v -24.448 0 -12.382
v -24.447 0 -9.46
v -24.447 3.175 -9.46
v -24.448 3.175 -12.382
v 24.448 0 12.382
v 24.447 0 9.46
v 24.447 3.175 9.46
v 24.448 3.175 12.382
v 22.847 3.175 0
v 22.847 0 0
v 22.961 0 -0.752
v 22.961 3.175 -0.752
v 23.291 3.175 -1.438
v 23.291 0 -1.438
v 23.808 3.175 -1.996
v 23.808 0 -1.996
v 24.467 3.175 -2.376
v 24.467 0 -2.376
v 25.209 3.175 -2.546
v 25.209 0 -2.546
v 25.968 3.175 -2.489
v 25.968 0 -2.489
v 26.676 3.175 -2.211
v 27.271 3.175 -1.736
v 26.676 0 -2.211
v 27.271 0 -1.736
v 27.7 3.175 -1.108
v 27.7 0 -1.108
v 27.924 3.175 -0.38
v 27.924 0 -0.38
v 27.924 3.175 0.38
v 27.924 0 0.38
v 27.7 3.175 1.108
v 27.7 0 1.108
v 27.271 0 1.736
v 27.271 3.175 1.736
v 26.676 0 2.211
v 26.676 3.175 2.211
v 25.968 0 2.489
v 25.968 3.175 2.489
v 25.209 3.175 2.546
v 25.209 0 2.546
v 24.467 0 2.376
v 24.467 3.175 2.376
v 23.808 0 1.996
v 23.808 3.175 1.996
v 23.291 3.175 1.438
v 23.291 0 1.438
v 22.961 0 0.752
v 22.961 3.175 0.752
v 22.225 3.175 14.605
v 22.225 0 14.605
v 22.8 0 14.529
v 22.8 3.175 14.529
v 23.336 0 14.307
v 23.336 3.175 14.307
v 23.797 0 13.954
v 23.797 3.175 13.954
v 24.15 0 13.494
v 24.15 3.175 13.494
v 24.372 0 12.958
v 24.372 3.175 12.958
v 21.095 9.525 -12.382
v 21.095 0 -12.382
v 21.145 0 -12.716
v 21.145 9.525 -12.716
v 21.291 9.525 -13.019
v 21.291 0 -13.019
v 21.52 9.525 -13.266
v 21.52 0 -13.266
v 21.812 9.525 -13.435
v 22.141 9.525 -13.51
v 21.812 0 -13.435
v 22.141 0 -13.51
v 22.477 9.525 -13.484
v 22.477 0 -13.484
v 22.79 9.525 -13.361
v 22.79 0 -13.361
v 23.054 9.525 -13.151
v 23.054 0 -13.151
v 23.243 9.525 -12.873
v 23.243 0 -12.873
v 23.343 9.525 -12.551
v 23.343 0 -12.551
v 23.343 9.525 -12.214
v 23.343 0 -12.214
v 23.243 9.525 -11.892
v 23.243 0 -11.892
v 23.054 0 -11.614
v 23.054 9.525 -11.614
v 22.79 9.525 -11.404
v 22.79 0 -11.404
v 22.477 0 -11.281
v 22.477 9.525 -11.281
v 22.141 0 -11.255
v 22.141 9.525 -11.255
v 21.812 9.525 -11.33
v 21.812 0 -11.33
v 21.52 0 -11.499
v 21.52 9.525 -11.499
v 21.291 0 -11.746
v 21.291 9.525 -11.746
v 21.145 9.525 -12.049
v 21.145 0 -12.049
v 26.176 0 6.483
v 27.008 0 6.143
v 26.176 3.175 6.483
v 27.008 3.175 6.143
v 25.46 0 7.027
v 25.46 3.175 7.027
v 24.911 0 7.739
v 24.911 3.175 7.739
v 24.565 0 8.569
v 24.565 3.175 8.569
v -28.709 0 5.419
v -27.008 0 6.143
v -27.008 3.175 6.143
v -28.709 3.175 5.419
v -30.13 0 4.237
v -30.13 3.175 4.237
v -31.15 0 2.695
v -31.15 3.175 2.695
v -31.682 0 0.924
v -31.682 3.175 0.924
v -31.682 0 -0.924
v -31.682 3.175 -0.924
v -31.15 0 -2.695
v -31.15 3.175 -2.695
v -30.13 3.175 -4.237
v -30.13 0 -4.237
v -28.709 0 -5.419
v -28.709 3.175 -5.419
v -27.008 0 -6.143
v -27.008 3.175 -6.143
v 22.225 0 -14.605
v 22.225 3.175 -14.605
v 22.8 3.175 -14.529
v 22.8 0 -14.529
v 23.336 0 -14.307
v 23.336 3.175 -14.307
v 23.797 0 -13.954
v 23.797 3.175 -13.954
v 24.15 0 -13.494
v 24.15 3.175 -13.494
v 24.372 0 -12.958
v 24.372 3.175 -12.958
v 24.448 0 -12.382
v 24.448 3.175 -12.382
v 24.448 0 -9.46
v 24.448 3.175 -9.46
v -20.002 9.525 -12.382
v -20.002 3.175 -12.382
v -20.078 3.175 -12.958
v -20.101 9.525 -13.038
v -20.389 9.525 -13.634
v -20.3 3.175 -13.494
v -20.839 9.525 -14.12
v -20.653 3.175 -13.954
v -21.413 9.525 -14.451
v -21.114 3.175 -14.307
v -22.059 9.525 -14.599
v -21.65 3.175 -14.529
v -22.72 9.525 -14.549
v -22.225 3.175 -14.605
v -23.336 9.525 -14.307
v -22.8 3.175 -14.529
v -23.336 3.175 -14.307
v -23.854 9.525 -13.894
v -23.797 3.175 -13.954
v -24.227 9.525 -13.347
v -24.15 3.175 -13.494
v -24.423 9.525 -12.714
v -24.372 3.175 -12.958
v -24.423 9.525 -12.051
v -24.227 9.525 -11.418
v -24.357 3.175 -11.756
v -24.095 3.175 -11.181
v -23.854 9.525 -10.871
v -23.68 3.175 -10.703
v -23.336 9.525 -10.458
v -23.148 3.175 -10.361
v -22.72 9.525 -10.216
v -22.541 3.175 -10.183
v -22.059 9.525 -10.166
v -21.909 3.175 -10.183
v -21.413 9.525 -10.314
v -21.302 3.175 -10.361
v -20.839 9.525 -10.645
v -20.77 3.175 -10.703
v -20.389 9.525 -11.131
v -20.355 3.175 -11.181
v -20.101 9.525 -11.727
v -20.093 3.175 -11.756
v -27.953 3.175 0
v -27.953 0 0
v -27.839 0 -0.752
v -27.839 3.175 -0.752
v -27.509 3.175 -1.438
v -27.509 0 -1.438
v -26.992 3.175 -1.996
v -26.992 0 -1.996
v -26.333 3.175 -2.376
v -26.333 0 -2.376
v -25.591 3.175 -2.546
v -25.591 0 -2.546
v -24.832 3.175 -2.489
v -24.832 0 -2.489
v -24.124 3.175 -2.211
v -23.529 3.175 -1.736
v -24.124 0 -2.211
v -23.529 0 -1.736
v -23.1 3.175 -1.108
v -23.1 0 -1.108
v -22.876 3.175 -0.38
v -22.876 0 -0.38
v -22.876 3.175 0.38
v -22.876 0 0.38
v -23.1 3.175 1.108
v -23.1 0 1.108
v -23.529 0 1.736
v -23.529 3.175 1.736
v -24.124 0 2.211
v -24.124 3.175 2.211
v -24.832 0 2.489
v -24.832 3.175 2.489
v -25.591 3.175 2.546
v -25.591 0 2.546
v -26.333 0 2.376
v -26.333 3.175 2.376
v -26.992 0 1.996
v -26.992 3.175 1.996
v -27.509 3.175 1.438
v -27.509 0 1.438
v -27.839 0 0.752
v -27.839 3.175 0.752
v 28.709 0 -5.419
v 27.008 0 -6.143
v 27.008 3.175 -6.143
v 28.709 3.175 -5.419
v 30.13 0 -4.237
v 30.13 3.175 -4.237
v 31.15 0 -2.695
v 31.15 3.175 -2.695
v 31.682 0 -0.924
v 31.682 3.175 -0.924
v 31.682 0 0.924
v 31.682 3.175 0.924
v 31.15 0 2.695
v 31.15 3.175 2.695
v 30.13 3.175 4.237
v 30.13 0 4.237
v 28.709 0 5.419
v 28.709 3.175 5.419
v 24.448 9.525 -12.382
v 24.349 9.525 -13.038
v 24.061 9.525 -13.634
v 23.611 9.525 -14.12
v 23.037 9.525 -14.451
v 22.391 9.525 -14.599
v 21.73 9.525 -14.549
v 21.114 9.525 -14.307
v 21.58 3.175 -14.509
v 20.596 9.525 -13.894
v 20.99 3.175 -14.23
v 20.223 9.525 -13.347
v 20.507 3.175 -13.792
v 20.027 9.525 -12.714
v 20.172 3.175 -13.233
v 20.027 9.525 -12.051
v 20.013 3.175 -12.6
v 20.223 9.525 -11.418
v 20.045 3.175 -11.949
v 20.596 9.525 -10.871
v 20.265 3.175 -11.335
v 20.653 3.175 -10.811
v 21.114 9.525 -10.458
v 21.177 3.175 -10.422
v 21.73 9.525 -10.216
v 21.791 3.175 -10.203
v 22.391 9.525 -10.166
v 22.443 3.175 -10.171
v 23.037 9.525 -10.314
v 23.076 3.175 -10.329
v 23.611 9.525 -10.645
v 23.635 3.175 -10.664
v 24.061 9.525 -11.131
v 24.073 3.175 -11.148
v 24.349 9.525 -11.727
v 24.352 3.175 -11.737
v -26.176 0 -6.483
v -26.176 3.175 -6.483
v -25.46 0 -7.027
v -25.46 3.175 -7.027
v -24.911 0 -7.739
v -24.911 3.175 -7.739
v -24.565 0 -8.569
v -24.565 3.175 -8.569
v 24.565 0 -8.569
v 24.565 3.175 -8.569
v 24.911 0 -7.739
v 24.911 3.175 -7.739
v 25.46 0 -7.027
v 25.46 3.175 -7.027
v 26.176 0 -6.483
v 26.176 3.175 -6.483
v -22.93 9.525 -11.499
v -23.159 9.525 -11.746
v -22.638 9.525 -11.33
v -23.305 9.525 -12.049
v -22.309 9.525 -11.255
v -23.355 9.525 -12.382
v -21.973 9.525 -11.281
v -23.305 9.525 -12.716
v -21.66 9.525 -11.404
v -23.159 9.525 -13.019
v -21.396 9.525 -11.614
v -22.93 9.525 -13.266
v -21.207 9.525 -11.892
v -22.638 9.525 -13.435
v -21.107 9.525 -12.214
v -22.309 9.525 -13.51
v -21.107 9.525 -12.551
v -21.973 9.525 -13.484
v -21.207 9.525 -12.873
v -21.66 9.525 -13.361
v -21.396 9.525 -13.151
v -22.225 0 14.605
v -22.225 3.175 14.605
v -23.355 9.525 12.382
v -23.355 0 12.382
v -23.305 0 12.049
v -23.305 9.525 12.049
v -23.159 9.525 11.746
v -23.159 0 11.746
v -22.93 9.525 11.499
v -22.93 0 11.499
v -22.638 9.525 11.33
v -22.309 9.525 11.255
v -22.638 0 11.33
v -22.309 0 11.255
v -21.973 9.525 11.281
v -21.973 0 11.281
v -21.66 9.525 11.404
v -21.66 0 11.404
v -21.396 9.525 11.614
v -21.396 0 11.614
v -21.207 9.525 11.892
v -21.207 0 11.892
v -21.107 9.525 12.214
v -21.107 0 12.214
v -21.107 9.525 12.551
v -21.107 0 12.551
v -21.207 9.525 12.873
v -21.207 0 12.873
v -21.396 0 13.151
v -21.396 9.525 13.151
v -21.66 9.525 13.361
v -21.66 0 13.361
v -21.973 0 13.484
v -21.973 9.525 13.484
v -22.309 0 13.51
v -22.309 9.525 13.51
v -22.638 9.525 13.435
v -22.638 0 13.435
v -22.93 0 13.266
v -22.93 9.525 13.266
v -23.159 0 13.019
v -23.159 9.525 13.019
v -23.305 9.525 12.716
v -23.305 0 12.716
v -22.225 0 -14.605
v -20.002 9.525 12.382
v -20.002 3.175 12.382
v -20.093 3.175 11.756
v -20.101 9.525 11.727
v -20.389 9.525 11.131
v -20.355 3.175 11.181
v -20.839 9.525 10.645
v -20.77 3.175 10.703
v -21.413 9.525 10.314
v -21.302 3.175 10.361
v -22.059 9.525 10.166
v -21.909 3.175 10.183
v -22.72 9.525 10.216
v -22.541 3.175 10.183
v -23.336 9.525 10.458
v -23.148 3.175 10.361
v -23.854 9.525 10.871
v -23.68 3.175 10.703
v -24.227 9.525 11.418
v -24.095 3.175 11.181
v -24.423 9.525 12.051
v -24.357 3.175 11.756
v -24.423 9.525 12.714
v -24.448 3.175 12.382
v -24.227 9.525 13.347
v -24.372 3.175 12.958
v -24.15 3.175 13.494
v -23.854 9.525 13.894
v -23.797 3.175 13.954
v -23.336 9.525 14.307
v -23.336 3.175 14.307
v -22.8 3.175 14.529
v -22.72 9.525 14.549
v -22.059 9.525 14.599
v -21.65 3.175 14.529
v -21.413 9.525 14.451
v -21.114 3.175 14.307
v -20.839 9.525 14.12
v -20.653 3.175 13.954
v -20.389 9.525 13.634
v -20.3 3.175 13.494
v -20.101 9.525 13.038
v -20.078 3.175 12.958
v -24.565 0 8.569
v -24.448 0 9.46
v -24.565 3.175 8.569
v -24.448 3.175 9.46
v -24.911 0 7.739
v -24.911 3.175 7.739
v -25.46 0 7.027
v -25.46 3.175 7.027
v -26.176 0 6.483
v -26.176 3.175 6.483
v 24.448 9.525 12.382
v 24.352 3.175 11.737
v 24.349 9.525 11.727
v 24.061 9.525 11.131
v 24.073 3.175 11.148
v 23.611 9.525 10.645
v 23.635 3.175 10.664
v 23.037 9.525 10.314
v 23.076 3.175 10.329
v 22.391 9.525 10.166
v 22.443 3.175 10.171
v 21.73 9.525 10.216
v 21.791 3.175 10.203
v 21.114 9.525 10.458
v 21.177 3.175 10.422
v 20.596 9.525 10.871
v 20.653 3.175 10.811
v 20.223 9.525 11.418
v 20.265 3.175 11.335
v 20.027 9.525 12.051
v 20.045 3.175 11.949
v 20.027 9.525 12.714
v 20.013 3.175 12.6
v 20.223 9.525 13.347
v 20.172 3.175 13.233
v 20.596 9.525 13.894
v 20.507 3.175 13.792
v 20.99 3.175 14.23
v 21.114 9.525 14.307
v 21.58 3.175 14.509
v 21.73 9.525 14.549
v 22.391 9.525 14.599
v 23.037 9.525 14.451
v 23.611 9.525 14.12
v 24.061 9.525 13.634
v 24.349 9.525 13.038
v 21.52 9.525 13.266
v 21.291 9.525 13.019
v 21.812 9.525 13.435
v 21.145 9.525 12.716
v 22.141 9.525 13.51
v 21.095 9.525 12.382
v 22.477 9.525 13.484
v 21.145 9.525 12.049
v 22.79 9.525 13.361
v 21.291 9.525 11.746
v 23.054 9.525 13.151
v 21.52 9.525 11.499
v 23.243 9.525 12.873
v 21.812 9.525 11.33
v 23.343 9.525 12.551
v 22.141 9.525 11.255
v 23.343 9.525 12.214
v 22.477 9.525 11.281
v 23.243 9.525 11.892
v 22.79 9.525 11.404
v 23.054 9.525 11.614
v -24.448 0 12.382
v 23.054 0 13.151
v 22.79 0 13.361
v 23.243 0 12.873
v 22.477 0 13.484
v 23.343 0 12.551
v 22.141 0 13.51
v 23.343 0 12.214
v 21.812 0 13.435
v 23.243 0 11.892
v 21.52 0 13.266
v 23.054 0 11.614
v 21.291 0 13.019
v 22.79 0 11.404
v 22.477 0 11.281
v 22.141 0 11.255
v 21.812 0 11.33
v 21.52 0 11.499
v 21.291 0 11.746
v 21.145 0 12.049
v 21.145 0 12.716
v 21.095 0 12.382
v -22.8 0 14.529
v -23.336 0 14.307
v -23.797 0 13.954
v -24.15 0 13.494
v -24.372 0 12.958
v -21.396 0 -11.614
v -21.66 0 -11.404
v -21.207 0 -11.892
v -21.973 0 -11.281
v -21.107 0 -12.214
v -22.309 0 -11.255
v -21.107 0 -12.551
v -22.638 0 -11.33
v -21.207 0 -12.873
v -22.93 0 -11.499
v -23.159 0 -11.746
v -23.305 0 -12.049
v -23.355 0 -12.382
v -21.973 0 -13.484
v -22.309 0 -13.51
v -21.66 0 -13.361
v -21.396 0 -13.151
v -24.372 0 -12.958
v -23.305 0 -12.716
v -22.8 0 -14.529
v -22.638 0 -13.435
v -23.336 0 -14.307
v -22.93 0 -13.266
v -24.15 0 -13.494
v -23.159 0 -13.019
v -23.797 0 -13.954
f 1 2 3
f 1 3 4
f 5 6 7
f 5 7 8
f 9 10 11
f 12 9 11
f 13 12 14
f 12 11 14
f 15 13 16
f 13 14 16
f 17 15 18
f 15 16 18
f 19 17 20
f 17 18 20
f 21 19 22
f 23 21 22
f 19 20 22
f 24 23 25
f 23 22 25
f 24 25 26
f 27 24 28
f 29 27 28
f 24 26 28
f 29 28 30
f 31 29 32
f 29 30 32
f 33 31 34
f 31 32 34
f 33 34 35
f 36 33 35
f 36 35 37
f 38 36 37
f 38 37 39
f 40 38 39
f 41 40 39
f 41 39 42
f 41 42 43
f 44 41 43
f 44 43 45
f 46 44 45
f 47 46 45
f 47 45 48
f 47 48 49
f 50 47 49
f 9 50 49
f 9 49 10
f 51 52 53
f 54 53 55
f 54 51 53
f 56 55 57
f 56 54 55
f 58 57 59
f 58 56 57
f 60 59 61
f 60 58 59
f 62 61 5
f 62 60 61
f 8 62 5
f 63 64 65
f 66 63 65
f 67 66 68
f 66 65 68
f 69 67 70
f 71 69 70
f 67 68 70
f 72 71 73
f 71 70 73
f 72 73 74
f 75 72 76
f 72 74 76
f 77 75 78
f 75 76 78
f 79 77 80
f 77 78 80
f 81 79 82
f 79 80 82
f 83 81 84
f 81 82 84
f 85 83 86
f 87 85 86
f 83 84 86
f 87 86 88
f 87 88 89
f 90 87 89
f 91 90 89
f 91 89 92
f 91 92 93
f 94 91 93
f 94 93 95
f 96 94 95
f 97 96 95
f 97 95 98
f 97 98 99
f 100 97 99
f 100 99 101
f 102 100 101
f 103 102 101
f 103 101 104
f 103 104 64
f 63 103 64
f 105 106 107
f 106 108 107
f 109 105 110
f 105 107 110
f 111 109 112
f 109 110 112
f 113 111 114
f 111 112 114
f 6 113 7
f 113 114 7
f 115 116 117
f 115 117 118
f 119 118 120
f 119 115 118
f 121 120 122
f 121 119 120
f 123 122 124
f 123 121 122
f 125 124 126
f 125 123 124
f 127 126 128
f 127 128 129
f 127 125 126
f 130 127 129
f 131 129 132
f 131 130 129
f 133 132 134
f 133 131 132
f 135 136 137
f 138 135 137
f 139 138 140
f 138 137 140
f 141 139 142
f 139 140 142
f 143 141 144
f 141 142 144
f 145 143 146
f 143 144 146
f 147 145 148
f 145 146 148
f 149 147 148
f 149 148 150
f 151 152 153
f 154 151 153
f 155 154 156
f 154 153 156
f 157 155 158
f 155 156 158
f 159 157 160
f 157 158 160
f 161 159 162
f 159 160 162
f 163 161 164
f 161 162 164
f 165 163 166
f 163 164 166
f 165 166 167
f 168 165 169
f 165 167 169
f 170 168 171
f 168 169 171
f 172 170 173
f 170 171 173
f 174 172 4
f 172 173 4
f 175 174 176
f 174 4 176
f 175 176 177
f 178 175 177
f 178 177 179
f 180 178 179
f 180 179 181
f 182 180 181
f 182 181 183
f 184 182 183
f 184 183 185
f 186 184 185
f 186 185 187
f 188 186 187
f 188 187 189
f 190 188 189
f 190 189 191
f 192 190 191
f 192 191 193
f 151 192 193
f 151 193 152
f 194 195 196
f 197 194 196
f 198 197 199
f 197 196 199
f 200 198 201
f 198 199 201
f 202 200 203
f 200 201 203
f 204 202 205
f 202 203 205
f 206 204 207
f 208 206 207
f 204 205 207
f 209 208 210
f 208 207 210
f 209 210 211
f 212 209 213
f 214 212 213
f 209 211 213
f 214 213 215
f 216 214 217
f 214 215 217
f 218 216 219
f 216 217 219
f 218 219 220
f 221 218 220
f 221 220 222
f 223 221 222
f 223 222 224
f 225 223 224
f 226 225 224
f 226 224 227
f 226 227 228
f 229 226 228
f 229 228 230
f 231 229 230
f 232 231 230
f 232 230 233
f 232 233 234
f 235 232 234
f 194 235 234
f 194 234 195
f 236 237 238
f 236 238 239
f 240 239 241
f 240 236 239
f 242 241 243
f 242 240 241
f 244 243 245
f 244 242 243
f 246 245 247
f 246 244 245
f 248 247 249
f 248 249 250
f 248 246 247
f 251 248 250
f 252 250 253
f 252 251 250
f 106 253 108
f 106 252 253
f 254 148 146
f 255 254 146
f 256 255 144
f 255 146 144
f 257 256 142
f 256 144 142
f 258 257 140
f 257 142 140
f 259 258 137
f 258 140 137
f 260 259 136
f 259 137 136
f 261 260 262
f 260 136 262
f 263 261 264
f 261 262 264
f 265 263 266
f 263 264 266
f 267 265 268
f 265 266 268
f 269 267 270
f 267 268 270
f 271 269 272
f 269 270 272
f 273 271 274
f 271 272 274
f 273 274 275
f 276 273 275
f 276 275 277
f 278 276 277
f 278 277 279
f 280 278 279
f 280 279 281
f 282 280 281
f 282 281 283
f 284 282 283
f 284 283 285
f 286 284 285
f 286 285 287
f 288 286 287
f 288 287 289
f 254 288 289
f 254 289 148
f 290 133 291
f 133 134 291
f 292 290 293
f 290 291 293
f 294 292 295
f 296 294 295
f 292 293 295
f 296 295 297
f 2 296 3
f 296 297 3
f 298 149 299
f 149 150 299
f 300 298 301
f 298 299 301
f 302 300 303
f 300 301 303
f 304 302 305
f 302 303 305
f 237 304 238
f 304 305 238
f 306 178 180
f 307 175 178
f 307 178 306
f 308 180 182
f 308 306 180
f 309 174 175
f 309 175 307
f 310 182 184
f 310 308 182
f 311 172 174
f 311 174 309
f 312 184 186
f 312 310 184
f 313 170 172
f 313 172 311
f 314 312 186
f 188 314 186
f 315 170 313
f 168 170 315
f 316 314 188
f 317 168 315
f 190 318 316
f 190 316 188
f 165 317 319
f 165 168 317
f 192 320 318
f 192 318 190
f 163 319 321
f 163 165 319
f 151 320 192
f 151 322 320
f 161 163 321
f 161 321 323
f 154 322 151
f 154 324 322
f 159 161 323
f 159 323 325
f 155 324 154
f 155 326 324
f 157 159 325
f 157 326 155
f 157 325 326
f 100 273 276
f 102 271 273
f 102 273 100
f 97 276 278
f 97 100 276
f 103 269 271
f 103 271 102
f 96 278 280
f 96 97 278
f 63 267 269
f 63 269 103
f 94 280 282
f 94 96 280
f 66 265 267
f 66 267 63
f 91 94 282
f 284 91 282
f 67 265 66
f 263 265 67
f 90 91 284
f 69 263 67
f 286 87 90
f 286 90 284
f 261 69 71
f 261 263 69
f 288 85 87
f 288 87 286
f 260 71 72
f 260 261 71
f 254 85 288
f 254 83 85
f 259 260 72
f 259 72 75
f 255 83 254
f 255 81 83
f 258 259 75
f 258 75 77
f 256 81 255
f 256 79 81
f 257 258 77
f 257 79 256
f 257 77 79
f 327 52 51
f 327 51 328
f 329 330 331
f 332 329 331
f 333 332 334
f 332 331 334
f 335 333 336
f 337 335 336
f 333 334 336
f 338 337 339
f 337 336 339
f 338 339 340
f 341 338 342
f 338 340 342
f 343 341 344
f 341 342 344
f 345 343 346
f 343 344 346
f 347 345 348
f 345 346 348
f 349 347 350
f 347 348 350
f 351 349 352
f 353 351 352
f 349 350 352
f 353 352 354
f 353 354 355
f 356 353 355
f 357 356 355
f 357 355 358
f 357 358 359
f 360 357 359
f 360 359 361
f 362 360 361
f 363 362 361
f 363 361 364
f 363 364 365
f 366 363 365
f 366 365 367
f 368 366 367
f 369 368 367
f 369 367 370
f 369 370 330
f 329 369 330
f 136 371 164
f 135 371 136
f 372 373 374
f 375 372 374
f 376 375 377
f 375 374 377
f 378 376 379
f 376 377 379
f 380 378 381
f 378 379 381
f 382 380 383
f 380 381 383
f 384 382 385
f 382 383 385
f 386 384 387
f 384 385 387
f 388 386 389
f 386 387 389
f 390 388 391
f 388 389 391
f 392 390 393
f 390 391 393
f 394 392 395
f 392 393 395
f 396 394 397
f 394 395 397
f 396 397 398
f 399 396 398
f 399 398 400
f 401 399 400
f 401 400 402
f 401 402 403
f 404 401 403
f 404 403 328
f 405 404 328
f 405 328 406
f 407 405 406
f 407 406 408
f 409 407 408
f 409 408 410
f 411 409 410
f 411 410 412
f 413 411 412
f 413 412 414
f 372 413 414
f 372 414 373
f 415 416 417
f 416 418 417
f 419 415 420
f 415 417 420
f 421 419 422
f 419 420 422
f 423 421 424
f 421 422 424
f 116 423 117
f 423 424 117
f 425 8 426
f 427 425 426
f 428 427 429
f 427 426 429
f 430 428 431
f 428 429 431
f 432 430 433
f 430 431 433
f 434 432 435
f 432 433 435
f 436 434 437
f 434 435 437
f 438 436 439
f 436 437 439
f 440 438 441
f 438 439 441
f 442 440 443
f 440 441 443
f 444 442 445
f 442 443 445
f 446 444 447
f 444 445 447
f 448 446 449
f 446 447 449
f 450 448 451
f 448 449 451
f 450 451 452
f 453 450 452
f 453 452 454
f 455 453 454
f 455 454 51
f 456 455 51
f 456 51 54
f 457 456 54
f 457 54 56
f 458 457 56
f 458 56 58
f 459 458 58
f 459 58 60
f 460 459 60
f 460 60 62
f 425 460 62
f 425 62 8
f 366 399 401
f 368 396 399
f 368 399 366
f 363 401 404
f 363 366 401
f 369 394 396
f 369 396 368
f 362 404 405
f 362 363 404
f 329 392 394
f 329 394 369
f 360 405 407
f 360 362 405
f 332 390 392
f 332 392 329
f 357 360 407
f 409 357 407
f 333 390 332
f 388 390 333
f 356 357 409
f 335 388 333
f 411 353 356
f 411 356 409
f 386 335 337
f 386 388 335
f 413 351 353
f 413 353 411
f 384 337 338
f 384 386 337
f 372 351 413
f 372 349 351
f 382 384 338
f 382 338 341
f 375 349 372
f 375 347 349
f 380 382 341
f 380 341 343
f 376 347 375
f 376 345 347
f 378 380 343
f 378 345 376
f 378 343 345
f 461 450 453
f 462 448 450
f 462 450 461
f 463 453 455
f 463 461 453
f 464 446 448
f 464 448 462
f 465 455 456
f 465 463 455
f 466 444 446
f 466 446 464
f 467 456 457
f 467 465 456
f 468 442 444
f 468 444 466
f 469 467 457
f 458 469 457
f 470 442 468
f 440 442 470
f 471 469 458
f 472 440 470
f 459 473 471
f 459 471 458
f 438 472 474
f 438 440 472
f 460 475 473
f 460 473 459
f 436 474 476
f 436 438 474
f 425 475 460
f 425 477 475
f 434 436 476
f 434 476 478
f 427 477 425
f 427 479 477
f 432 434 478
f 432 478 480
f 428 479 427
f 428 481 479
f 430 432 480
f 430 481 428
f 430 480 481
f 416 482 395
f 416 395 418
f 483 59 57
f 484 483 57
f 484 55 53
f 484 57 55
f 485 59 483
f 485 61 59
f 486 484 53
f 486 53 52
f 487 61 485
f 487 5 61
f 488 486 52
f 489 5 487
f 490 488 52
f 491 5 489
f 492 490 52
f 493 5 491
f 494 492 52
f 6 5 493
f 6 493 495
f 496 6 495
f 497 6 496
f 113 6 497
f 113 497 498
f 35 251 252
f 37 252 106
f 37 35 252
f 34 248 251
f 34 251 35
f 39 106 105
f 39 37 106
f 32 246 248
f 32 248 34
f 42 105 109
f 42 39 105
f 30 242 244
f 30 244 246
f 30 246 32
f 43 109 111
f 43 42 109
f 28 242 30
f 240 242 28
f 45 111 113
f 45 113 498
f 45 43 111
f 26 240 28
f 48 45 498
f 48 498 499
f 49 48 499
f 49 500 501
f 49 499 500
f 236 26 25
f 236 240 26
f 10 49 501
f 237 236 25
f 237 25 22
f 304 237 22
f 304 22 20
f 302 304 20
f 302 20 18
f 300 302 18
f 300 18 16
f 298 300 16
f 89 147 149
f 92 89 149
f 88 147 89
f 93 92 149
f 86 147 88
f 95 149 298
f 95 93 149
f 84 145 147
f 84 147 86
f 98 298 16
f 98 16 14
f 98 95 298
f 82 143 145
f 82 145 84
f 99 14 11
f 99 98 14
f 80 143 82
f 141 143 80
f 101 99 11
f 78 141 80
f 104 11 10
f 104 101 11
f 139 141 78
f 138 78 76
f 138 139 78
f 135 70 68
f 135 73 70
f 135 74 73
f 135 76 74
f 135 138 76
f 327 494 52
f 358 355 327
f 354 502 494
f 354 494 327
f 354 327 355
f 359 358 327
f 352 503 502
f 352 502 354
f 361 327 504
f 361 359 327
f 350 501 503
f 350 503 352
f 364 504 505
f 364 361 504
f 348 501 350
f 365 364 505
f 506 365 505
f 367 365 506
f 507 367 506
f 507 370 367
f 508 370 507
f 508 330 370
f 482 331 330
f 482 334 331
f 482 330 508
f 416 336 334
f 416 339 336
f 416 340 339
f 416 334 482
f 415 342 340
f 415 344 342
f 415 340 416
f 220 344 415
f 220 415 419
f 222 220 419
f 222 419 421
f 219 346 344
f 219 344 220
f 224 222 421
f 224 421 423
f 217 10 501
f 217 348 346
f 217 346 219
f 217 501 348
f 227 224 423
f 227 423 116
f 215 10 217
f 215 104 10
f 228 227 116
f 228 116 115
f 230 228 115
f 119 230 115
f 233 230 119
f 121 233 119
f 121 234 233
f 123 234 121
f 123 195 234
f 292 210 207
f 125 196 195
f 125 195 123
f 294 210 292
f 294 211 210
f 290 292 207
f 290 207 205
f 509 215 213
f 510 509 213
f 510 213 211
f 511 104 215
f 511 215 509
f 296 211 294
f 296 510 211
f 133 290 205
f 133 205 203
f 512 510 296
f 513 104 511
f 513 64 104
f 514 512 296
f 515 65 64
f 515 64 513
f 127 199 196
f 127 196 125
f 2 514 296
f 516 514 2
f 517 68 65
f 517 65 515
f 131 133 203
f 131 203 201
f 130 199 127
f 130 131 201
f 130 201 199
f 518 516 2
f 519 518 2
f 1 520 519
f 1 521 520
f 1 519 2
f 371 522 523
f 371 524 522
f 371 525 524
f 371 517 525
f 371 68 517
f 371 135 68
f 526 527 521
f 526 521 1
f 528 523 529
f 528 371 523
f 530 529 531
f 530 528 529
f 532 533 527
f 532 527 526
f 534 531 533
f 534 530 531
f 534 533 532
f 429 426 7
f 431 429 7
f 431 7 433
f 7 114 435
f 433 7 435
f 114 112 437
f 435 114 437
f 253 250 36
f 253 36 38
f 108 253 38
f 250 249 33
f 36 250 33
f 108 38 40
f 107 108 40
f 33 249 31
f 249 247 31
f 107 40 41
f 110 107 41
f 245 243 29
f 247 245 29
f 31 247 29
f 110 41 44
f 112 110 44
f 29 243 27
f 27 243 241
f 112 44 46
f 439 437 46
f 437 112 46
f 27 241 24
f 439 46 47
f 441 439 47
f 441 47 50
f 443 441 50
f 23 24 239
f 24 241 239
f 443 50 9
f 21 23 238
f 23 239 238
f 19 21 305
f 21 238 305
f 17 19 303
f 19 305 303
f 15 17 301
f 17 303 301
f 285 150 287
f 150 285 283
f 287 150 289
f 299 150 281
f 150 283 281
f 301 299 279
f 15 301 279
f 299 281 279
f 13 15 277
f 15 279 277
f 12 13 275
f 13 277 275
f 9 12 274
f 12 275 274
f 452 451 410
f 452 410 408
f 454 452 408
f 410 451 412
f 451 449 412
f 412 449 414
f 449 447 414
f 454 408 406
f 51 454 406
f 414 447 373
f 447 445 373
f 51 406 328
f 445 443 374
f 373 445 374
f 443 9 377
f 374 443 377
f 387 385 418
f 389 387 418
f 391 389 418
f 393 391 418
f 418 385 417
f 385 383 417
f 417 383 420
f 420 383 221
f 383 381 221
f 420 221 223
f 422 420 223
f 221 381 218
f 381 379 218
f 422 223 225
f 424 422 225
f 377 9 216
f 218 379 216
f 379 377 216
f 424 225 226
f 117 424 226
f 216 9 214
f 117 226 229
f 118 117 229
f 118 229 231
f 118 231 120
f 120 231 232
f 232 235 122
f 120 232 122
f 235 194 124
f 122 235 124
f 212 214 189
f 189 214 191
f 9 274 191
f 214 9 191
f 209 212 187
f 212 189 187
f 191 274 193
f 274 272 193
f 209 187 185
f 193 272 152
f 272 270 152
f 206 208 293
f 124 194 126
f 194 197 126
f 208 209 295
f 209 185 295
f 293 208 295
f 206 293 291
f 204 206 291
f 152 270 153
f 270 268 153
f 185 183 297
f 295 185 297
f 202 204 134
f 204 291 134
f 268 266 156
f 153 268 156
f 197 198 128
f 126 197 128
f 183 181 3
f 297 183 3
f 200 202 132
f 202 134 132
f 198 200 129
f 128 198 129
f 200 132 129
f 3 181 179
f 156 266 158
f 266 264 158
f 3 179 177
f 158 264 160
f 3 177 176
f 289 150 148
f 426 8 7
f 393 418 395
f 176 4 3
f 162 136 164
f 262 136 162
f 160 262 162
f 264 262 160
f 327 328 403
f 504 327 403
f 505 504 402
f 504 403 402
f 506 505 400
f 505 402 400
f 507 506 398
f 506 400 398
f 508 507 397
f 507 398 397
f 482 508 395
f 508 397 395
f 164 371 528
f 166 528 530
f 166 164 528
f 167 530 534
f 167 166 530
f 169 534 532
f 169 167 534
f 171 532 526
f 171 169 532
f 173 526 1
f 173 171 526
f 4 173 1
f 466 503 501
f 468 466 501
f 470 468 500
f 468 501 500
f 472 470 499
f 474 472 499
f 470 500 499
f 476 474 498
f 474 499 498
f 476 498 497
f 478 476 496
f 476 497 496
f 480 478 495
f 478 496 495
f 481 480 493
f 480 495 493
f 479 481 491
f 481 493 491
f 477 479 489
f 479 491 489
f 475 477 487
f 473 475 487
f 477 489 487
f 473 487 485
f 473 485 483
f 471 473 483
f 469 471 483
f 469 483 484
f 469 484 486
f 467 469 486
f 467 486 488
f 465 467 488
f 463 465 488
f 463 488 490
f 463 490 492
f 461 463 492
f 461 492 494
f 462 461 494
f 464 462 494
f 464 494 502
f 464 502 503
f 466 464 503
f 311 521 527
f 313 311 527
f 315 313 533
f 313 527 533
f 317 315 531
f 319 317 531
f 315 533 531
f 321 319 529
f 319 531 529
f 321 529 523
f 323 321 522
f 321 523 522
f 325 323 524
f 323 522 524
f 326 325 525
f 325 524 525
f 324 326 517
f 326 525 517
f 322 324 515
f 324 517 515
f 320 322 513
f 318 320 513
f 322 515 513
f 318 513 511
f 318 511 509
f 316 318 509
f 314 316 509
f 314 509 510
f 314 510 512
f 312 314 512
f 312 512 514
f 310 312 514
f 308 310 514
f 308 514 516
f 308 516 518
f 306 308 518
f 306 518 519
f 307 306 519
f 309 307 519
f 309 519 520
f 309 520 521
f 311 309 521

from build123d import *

# Parameters (mm, degrees)
BOSS_EXTRUDE1_DEPTH    = 3.175
FILLET1_R              = 3.429
F_10_CLEARANCE_HOLE1_D = 5.1054
SKETCH4_R              = 2.2225
BOSS_EXTRUDE2_DEPTH    = 6.35
F_4_40_TAPPED_HOLE1_D  = 2.2606
CUT_EXTRUDE1_DEPTH     = 4.175
MIRROR2_COPY_1_DEPTH   = 4.175


with BuildPart() as part:
    # Sketch1 → Boss-Extrude1 (new body)
    with BuildSketch(Plane(origin=(0, 0, 0), x_dir=(1, 0, 0), z_dir=(0, 1, 0))):
        with BuildLine():
            Line((-24.4475, 14.605), (24.4475, 14.605))
            Line((24.4475, 14.605), (24.4475, 6.278156079))
            ThreePointArc((24.4475, 6.278156079), (31.75, 0), (24.4475, -6.278156079))
            Line((24.4475, -6.278156079), (24.4475, -14.605))
            Line((24.4475, -14.605), (-24.4475, -14.605))
            Line((-24.4475, -14.605), (-24.4475, -6.278156079))
            ThreePointArc((-24.4475, -6.278156079), (-31.75, 0), (-24.4475, 6.278156079))
            Line((-24.4475, 6.278156079), (-24.4475, 14.605))
        make_face()
    extrude(amount=BOSS_EXTRUDE1_DEPTH)

    # Fillet1
    fillet1_edges = [part.edges().sort_by_distance(p)[0] for p in [
        (-24.4475, 1.5875, 6.278156079),
        (-24.4475, 1.5875, -6.278156079),
        (24.4475, 1.5875, -6.278156079),
        (24.4475, 1.5875, 6.278156079),
    ]]
    fillet(fillet1_edges, radius=FILLET1_R)

    # #10 Clearance Hole1 (through all)
    with Locations(Plane(origin=(0, 3.175, 0), x_dir=(1, 0, 0), z_dir=(0, 1, 0))):
        with Locations((25.4, 0), (-25.4, 0)):
            Hole(F_10_CLEARANCE_HOLE1_D / 2)

    # Sketch4 → Boss-Extrude2 (add)
    with BuildSketch(Plane(origin=(0, 3.175, 0), x_dir=(1, 0, 0), z_dir=(0, 1, 0))):
        with Locations((-22.225, 12.3825)):
            Circle(SKETCH4_R)
        with Locations((22.225, 12.3825)):
            Circle(SKETCH4_R)
        with Locations((22.225, -12.3825)):
            Circle(SKETCH4_R)
        with Locations((-22.225, -12.3825)):
            Circle(SKETCH4_R)
    extrude(amount=BOSS_EXTRUDE2_DEPTH)

    # #4-40 Tapped Hole1 (through all)
    with Locations(Plane(origin=(0, 9.525, 0), x_dir=(1, 0, 0), z_dir=(0, 1, 0))):
        with Locations((22.225, 12.3825), (-22.225, 12.3825), (-22.225, -12.3825), (22.225, -12.3825)):
            Hole(F_4_40_TAPPED_HOLE1_D / 2)

    # Sketch7 → Cut-Extrude1 (cut, through all)
    with BuildSketch(Plane(origin=(0, 3.175, 0), x_dir=(1, 0, 0), z_dir=(0, 1, 0))):
        with BuildLine():
            Line((-24.4475, -14.605), (-22.225, -14.605))
            ThreePointArc((-22.225, -14.605), (-23.796544821, -13.954044821), (-24.4475, -12.3825))
            Line((-24.4475, -12.3825), (-24.4475, -14.605))
        make_face()
    cut_extrude1 = extrude(amount=-CUT_EXTRUDE1_DEPTH, mode=Mode.SUBTRACT)

    # Mirror1: Cut-Extrude1 across plane
    add(cut_extrude1.mirror(Plane.XY), mode=Mode.SUBTRACT)

    # Mirror2: Cut-Extrude1 across plane
    add(cut_extrude1.mirror(Plane(origin=(0, 0, 0), x_dir=(0, 0, 1), z_dir=(1, 0, 0))), mode=Mode.SUBTRACT)

    # Mirror2 copy 1 sketch → Mirror2 copy 1 (cut, through all)
    with BuildSketch(Plane(origin=(0, 3.175, 0), x_dir=(-1, 0, 0), z_dir=(0, 1, 0))):
        with BuildLine():
            Line((-24.4475, -14.605), (-22.225, -14.605))
            ThreePointArc((-22.225, -14.605), (-23.796544821, -13.954044821), (-24.4475, -12.3825))
            Line((-24.4475, -12.3825), (-24.4475, -14.605))
        make_face()
    extrude(amount=-MIRROR2_COPY_1_DEPTH, mode=Mode.SUBTRACT)


solid = part.part
